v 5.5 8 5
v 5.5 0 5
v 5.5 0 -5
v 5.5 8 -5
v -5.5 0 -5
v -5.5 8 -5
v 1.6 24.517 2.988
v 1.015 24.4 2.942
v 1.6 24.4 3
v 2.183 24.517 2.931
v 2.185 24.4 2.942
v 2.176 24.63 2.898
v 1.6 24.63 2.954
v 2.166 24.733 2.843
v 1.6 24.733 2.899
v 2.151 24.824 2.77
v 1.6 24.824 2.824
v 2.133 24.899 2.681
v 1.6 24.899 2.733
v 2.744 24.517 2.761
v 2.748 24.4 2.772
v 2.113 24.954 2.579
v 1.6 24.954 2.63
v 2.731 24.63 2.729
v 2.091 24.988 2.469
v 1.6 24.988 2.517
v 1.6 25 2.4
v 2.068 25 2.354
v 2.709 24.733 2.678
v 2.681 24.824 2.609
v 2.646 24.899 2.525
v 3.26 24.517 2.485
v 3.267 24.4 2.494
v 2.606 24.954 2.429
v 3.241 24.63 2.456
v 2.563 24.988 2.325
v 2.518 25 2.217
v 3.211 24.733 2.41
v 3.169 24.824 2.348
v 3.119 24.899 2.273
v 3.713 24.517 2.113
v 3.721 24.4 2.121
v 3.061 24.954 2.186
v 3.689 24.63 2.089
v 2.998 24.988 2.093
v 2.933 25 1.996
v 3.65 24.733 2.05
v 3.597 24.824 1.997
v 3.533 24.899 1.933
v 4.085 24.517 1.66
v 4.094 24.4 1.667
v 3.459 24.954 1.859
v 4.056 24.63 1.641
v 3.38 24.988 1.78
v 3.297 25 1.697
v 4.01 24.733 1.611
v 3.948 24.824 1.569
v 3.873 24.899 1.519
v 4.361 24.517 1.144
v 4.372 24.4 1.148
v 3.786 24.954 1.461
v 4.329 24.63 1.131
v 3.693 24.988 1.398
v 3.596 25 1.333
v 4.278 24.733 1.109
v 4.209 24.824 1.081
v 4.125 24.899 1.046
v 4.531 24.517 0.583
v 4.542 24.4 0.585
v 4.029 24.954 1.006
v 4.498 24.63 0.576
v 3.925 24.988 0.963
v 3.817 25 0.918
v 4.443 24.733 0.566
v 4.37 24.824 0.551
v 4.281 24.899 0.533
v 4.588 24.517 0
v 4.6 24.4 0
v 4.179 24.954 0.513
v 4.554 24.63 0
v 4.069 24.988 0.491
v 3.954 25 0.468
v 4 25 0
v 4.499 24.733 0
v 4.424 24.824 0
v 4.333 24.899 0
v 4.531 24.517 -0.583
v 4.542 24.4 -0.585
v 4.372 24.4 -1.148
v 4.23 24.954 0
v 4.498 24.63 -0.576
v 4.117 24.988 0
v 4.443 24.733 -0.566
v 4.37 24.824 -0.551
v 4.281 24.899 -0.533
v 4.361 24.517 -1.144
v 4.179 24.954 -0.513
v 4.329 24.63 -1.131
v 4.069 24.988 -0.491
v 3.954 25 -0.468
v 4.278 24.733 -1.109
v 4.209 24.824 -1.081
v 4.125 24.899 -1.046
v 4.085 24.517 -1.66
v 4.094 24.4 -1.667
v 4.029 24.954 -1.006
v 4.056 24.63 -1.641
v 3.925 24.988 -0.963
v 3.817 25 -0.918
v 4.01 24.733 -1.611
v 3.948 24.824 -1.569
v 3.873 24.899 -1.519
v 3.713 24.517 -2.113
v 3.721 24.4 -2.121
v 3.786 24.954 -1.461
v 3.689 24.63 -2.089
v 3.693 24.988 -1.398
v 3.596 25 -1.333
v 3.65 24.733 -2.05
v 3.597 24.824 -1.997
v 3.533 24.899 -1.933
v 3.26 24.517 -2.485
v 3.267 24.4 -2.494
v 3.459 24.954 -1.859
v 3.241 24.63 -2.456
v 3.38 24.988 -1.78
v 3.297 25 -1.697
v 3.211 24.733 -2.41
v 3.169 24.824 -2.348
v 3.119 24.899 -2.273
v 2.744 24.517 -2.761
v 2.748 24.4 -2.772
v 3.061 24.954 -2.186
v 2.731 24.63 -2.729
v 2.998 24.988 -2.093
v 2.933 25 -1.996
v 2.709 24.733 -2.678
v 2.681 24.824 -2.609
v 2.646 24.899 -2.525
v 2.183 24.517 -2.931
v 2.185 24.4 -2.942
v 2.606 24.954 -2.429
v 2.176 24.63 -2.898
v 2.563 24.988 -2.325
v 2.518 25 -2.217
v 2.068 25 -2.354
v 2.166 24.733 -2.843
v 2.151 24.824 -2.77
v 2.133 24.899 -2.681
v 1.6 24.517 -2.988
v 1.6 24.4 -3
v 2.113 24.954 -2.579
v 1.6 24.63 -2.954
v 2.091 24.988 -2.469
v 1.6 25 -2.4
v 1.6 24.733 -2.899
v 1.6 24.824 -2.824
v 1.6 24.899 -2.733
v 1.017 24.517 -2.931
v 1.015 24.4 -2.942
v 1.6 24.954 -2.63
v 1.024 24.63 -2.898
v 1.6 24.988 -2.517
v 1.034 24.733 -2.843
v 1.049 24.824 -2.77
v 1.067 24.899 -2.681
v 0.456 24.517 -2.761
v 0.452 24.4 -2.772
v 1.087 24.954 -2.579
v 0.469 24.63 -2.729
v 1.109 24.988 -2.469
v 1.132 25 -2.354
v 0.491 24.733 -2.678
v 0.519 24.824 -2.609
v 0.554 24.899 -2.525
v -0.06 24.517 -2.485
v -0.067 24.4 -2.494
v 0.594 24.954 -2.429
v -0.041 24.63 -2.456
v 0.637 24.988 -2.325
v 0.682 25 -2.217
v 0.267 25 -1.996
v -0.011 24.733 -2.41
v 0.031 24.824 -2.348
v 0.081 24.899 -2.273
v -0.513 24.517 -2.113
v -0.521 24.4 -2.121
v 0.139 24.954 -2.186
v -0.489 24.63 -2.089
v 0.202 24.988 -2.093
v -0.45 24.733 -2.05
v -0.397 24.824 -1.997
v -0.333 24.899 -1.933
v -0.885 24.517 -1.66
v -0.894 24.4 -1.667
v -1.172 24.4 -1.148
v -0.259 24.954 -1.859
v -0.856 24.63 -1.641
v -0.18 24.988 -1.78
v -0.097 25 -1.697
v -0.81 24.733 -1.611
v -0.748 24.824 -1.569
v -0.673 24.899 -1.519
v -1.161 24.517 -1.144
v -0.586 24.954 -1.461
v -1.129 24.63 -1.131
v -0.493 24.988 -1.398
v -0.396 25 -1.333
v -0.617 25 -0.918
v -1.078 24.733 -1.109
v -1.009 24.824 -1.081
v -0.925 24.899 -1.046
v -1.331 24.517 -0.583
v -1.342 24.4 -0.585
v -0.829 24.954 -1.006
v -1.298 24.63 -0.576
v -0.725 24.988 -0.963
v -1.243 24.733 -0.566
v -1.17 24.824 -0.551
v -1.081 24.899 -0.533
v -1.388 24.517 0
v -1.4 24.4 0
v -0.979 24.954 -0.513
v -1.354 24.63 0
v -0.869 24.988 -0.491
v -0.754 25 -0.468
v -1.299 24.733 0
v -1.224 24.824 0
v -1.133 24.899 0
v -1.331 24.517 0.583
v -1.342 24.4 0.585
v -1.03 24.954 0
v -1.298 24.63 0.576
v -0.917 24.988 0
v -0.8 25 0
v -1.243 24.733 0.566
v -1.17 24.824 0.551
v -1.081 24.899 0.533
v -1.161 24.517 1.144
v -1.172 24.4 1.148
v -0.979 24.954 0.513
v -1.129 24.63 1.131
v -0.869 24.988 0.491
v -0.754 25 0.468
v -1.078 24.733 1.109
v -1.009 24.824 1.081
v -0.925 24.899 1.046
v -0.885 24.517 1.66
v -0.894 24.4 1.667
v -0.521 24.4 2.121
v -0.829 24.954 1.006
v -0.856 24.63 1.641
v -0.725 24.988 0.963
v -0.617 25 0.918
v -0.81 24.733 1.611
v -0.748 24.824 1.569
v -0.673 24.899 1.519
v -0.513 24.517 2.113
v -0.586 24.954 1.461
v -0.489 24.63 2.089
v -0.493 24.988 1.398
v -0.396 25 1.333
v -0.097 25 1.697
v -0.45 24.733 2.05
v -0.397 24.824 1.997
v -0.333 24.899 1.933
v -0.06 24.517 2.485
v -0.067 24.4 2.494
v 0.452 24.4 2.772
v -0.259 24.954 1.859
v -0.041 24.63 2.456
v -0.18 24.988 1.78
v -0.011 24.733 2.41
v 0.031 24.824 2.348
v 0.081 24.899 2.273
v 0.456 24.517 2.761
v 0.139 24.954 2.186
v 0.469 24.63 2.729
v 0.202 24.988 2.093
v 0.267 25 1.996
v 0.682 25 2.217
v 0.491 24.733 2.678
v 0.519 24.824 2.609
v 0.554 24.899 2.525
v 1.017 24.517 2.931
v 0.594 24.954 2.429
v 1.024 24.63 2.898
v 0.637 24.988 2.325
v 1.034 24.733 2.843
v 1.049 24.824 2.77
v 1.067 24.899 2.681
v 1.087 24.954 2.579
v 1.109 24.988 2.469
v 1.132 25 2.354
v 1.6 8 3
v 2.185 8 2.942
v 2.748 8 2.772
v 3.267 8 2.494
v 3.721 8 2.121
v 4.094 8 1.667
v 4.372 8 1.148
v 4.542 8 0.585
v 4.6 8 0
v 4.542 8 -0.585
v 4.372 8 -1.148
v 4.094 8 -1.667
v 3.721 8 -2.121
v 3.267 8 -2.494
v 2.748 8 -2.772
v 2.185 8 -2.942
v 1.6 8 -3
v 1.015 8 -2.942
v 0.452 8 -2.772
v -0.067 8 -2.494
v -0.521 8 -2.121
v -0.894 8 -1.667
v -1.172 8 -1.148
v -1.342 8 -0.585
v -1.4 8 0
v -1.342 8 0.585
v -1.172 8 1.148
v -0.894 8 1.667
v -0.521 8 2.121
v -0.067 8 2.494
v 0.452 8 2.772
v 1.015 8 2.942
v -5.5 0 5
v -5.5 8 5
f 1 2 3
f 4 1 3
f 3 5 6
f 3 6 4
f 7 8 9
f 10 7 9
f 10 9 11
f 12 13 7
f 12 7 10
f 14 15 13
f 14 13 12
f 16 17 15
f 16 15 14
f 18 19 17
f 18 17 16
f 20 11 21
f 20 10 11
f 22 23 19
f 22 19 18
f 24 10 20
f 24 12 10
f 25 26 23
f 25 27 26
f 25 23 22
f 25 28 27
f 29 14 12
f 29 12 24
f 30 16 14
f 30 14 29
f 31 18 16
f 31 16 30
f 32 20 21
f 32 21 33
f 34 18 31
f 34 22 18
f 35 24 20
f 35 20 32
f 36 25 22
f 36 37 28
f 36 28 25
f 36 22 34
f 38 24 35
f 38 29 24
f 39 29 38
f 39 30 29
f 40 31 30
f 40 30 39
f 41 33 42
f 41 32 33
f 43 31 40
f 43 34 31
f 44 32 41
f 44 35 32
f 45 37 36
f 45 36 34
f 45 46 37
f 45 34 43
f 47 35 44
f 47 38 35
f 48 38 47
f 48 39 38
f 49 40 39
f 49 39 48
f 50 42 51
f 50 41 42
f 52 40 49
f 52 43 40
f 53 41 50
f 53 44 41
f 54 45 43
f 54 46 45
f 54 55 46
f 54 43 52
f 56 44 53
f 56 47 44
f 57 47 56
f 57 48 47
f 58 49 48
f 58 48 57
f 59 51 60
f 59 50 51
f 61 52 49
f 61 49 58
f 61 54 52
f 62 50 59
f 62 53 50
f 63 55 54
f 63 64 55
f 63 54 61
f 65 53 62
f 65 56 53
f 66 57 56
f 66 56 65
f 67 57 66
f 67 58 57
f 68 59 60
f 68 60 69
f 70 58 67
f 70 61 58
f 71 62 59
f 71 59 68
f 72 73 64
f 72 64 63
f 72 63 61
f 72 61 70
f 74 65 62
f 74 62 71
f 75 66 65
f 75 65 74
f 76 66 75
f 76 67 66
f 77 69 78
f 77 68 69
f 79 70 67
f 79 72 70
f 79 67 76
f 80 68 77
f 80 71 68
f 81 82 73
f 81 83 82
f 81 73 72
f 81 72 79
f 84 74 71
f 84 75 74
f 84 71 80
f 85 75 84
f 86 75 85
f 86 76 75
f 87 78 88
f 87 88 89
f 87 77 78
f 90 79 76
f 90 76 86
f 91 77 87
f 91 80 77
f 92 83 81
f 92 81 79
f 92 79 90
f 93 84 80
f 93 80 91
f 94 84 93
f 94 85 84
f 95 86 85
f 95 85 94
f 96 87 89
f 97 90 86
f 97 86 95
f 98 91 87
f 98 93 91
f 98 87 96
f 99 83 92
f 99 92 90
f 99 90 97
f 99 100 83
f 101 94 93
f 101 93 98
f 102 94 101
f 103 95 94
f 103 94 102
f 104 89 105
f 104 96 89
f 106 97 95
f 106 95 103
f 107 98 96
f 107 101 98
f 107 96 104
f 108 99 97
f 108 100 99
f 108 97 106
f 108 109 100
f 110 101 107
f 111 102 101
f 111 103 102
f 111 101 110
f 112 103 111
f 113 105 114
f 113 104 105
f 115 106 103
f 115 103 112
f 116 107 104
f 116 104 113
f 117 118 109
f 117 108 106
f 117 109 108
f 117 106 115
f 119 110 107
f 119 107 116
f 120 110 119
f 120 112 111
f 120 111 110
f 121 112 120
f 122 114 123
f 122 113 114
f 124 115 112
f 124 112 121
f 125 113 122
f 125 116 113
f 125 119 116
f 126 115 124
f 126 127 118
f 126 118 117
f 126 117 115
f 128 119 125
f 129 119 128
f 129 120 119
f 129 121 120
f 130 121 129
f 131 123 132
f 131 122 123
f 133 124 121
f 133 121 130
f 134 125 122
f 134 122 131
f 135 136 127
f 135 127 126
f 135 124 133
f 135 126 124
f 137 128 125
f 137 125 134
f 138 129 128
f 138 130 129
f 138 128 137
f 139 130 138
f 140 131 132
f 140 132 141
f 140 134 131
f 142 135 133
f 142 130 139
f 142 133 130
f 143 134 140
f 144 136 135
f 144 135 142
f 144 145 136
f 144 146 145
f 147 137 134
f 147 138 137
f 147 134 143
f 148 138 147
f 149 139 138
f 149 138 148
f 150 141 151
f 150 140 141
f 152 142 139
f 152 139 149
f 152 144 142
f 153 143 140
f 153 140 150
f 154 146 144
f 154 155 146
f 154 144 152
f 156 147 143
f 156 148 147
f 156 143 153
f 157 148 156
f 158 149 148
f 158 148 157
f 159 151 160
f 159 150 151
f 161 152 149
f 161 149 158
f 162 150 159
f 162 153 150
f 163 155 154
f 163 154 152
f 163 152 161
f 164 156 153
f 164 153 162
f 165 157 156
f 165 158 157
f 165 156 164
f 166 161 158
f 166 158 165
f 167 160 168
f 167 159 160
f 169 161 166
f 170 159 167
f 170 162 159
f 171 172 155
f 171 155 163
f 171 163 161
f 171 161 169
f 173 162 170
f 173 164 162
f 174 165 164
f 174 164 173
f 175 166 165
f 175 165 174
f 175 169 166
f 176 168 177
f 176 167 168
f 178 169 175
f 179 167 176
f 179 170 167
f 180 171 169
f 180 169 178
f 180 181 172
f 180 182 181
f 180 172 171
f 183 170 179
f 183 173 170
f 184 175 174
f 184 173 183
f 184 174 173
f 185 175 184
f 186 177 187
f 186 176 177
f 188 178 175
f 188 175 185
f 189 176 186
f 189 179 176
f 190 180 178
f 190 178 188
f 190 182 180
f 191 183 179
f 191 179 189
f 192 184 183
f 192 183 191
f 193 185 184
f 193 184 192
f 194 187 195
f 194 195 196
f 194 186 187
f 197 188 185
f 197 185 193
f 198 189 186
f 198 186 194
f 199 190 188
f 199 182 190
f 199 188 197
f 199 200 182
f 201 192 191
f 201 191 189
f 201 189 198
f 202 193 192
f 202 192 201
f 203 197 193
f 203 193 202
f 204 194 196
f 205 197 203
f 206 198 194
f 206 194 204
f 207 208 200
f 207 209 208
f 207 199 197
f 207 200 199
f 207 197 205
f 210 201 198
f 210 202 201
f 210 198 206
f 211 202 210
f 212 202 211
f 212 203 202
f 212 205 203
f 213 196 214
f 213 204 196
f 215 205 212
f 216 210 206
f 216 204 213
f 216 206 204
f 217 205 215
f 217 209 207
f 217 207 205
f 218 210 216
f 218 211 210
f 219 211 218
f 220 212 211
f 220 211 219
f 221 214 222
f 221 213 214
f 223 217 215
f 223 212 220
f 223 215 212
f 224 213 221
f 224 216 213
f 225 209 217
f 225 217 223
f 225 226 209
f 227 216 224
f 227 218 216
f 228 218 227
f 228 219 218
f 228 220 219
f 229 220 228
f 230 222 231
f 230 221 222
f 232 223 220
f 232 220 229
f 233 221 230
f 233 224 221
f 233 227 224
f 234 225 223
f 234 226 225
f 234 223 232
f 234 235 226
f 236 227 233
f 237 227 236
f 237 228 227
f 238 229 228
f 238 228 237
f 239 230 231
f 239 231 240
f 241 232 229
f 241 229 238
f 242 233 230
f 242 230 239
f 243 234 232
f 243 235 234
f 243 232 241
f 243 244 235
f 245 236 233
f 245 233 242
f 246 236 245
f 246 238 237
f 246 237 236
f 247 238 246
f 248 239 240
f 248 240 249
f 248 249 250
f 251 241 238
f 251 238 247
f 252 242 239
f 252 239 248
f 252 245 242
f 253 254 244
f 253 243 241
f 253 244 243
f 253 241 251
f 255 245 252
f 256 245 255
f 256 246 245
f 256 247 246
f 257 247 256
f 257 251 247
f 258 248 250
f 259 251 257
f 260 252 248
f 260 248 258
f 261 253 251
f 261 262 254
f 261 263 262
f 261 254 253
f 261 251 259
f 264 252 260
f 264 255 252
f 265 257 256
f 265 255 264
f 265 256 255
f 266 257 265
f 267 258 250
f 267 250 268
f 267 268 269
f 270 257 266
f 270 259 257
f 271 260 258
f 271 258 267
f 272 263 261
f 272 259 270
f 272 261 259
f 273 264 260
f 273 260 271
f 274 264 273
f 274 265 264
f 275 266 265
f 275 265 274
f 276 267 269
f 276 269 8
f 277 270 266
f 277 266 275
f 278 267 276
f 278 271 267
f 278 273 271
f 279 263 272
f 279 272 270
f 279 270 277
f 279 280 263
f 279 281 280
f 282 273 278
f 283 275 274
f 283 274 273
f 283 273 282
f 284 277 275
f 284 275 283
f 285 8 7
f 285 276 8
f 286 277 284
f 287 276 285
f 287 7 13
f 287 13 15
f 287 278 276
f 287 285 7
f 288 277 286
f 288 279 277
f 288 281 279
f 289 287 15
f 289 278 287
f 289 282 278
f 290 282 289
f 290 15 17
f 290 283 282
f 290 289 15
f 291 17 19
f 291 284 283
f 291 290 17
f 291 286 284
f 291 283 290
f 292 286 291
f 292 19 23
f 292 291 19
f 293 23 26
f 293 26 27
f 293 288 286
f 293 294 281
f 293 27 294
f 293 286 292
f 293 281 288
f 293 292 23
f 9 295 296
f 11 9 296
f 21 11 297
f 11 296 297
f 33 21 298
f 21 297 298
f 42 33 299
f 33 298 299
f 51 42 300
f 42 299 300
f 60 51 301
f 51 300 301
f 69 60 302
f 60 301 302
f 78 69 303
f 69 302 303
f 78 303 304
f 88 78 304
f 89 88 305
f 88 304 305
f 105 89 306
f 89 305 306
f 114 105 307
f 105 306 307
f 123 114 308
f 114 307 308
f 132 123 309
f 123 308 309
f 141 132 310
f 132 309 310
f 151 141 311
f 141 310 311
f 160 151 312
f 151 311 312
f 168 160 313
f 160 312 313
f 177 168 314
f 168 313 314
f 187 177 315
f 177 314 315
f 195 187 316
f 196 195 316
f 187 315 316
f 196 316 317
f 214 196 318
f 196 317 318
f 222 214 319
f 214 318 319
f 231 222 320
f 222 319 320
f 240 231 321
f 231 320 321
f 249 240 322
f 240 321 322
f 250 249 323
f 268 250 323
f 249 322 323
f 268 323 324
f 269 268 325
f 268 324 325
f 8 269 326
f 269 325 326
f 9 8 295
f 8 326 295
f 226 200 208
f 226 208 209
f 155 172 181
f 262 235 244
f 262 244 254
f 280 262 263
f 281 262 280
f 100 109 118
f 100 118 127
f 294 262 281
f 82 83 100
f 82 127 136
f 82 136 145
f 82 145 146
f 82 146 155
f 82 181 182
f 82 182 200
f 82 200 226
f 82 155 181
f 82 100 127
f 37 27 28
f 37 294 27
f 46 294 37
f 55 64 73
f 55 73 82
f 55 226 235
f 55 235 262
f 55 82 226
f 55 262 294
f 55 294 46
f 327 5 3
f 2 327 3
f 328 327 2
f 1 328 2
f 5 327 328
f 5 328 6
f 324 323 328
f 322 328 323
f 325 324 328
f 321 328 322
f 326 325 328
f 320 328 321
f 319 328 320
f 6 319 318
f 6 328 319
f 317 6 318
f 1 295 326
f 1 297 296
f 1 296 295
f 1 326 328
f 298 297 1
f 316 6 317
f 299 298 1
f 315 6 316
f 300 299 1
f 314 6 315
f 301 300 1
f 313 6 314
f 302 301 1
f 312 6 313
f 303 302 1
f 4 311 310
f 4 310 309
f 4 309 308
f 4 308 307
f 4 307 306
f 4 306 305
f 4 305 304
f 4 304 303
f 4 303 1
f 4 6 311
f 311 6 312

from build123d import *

# Parameters (mm, degrees)
SKETCH1_R           = 3
BOSS_EXTRUDE1_DEPTH = 25
SKETCH1_3_W         = 11
SKETCH1_3_H         = 10
SKETCH1_3_R         = 3
BOSS_EXTRUDE2_DEPTH = 8
FILLET1_R           = 0.6


with BuildPart() as part:
    # Sketch1 → Boss-Extrude1 (new body)
    with BuildSketch(Plane(origin=(0, 0, 0), x_dir=(1, 0, 0), z_dir=(0, 1, 0))):
        with Locations((1.6, 0)):
            Circle(SKETCH1_R)
    extrude(amount=BOSS_EXTRUDE1_DEPTH)

    # Sketch1<3> → Boss-Extrude2 (add)
    with BuildSketch(Plane(origin=(0, 0, 0), x_dir=(1, 0, 0), z_dir=(0, 1, 0))):
        Rectangle(SKETCH1_3_W, SKETCH1_3_H)
        with Locations((1.6, 0)):
            Circle(SKETCH1_3_R, mode=Mode.SUBTRACT)
    extrude(amount=BOSS_EXTRUDE2_DEPTH)

    # Fillet1
    fillet1_edges = [part.edges().sort_by_distance(p)[0] for p in [
        (-1.4, 25, 0),
    ]]
    fillet(fillet1_edges, radius=FILLET1_R)


solid = part.part
